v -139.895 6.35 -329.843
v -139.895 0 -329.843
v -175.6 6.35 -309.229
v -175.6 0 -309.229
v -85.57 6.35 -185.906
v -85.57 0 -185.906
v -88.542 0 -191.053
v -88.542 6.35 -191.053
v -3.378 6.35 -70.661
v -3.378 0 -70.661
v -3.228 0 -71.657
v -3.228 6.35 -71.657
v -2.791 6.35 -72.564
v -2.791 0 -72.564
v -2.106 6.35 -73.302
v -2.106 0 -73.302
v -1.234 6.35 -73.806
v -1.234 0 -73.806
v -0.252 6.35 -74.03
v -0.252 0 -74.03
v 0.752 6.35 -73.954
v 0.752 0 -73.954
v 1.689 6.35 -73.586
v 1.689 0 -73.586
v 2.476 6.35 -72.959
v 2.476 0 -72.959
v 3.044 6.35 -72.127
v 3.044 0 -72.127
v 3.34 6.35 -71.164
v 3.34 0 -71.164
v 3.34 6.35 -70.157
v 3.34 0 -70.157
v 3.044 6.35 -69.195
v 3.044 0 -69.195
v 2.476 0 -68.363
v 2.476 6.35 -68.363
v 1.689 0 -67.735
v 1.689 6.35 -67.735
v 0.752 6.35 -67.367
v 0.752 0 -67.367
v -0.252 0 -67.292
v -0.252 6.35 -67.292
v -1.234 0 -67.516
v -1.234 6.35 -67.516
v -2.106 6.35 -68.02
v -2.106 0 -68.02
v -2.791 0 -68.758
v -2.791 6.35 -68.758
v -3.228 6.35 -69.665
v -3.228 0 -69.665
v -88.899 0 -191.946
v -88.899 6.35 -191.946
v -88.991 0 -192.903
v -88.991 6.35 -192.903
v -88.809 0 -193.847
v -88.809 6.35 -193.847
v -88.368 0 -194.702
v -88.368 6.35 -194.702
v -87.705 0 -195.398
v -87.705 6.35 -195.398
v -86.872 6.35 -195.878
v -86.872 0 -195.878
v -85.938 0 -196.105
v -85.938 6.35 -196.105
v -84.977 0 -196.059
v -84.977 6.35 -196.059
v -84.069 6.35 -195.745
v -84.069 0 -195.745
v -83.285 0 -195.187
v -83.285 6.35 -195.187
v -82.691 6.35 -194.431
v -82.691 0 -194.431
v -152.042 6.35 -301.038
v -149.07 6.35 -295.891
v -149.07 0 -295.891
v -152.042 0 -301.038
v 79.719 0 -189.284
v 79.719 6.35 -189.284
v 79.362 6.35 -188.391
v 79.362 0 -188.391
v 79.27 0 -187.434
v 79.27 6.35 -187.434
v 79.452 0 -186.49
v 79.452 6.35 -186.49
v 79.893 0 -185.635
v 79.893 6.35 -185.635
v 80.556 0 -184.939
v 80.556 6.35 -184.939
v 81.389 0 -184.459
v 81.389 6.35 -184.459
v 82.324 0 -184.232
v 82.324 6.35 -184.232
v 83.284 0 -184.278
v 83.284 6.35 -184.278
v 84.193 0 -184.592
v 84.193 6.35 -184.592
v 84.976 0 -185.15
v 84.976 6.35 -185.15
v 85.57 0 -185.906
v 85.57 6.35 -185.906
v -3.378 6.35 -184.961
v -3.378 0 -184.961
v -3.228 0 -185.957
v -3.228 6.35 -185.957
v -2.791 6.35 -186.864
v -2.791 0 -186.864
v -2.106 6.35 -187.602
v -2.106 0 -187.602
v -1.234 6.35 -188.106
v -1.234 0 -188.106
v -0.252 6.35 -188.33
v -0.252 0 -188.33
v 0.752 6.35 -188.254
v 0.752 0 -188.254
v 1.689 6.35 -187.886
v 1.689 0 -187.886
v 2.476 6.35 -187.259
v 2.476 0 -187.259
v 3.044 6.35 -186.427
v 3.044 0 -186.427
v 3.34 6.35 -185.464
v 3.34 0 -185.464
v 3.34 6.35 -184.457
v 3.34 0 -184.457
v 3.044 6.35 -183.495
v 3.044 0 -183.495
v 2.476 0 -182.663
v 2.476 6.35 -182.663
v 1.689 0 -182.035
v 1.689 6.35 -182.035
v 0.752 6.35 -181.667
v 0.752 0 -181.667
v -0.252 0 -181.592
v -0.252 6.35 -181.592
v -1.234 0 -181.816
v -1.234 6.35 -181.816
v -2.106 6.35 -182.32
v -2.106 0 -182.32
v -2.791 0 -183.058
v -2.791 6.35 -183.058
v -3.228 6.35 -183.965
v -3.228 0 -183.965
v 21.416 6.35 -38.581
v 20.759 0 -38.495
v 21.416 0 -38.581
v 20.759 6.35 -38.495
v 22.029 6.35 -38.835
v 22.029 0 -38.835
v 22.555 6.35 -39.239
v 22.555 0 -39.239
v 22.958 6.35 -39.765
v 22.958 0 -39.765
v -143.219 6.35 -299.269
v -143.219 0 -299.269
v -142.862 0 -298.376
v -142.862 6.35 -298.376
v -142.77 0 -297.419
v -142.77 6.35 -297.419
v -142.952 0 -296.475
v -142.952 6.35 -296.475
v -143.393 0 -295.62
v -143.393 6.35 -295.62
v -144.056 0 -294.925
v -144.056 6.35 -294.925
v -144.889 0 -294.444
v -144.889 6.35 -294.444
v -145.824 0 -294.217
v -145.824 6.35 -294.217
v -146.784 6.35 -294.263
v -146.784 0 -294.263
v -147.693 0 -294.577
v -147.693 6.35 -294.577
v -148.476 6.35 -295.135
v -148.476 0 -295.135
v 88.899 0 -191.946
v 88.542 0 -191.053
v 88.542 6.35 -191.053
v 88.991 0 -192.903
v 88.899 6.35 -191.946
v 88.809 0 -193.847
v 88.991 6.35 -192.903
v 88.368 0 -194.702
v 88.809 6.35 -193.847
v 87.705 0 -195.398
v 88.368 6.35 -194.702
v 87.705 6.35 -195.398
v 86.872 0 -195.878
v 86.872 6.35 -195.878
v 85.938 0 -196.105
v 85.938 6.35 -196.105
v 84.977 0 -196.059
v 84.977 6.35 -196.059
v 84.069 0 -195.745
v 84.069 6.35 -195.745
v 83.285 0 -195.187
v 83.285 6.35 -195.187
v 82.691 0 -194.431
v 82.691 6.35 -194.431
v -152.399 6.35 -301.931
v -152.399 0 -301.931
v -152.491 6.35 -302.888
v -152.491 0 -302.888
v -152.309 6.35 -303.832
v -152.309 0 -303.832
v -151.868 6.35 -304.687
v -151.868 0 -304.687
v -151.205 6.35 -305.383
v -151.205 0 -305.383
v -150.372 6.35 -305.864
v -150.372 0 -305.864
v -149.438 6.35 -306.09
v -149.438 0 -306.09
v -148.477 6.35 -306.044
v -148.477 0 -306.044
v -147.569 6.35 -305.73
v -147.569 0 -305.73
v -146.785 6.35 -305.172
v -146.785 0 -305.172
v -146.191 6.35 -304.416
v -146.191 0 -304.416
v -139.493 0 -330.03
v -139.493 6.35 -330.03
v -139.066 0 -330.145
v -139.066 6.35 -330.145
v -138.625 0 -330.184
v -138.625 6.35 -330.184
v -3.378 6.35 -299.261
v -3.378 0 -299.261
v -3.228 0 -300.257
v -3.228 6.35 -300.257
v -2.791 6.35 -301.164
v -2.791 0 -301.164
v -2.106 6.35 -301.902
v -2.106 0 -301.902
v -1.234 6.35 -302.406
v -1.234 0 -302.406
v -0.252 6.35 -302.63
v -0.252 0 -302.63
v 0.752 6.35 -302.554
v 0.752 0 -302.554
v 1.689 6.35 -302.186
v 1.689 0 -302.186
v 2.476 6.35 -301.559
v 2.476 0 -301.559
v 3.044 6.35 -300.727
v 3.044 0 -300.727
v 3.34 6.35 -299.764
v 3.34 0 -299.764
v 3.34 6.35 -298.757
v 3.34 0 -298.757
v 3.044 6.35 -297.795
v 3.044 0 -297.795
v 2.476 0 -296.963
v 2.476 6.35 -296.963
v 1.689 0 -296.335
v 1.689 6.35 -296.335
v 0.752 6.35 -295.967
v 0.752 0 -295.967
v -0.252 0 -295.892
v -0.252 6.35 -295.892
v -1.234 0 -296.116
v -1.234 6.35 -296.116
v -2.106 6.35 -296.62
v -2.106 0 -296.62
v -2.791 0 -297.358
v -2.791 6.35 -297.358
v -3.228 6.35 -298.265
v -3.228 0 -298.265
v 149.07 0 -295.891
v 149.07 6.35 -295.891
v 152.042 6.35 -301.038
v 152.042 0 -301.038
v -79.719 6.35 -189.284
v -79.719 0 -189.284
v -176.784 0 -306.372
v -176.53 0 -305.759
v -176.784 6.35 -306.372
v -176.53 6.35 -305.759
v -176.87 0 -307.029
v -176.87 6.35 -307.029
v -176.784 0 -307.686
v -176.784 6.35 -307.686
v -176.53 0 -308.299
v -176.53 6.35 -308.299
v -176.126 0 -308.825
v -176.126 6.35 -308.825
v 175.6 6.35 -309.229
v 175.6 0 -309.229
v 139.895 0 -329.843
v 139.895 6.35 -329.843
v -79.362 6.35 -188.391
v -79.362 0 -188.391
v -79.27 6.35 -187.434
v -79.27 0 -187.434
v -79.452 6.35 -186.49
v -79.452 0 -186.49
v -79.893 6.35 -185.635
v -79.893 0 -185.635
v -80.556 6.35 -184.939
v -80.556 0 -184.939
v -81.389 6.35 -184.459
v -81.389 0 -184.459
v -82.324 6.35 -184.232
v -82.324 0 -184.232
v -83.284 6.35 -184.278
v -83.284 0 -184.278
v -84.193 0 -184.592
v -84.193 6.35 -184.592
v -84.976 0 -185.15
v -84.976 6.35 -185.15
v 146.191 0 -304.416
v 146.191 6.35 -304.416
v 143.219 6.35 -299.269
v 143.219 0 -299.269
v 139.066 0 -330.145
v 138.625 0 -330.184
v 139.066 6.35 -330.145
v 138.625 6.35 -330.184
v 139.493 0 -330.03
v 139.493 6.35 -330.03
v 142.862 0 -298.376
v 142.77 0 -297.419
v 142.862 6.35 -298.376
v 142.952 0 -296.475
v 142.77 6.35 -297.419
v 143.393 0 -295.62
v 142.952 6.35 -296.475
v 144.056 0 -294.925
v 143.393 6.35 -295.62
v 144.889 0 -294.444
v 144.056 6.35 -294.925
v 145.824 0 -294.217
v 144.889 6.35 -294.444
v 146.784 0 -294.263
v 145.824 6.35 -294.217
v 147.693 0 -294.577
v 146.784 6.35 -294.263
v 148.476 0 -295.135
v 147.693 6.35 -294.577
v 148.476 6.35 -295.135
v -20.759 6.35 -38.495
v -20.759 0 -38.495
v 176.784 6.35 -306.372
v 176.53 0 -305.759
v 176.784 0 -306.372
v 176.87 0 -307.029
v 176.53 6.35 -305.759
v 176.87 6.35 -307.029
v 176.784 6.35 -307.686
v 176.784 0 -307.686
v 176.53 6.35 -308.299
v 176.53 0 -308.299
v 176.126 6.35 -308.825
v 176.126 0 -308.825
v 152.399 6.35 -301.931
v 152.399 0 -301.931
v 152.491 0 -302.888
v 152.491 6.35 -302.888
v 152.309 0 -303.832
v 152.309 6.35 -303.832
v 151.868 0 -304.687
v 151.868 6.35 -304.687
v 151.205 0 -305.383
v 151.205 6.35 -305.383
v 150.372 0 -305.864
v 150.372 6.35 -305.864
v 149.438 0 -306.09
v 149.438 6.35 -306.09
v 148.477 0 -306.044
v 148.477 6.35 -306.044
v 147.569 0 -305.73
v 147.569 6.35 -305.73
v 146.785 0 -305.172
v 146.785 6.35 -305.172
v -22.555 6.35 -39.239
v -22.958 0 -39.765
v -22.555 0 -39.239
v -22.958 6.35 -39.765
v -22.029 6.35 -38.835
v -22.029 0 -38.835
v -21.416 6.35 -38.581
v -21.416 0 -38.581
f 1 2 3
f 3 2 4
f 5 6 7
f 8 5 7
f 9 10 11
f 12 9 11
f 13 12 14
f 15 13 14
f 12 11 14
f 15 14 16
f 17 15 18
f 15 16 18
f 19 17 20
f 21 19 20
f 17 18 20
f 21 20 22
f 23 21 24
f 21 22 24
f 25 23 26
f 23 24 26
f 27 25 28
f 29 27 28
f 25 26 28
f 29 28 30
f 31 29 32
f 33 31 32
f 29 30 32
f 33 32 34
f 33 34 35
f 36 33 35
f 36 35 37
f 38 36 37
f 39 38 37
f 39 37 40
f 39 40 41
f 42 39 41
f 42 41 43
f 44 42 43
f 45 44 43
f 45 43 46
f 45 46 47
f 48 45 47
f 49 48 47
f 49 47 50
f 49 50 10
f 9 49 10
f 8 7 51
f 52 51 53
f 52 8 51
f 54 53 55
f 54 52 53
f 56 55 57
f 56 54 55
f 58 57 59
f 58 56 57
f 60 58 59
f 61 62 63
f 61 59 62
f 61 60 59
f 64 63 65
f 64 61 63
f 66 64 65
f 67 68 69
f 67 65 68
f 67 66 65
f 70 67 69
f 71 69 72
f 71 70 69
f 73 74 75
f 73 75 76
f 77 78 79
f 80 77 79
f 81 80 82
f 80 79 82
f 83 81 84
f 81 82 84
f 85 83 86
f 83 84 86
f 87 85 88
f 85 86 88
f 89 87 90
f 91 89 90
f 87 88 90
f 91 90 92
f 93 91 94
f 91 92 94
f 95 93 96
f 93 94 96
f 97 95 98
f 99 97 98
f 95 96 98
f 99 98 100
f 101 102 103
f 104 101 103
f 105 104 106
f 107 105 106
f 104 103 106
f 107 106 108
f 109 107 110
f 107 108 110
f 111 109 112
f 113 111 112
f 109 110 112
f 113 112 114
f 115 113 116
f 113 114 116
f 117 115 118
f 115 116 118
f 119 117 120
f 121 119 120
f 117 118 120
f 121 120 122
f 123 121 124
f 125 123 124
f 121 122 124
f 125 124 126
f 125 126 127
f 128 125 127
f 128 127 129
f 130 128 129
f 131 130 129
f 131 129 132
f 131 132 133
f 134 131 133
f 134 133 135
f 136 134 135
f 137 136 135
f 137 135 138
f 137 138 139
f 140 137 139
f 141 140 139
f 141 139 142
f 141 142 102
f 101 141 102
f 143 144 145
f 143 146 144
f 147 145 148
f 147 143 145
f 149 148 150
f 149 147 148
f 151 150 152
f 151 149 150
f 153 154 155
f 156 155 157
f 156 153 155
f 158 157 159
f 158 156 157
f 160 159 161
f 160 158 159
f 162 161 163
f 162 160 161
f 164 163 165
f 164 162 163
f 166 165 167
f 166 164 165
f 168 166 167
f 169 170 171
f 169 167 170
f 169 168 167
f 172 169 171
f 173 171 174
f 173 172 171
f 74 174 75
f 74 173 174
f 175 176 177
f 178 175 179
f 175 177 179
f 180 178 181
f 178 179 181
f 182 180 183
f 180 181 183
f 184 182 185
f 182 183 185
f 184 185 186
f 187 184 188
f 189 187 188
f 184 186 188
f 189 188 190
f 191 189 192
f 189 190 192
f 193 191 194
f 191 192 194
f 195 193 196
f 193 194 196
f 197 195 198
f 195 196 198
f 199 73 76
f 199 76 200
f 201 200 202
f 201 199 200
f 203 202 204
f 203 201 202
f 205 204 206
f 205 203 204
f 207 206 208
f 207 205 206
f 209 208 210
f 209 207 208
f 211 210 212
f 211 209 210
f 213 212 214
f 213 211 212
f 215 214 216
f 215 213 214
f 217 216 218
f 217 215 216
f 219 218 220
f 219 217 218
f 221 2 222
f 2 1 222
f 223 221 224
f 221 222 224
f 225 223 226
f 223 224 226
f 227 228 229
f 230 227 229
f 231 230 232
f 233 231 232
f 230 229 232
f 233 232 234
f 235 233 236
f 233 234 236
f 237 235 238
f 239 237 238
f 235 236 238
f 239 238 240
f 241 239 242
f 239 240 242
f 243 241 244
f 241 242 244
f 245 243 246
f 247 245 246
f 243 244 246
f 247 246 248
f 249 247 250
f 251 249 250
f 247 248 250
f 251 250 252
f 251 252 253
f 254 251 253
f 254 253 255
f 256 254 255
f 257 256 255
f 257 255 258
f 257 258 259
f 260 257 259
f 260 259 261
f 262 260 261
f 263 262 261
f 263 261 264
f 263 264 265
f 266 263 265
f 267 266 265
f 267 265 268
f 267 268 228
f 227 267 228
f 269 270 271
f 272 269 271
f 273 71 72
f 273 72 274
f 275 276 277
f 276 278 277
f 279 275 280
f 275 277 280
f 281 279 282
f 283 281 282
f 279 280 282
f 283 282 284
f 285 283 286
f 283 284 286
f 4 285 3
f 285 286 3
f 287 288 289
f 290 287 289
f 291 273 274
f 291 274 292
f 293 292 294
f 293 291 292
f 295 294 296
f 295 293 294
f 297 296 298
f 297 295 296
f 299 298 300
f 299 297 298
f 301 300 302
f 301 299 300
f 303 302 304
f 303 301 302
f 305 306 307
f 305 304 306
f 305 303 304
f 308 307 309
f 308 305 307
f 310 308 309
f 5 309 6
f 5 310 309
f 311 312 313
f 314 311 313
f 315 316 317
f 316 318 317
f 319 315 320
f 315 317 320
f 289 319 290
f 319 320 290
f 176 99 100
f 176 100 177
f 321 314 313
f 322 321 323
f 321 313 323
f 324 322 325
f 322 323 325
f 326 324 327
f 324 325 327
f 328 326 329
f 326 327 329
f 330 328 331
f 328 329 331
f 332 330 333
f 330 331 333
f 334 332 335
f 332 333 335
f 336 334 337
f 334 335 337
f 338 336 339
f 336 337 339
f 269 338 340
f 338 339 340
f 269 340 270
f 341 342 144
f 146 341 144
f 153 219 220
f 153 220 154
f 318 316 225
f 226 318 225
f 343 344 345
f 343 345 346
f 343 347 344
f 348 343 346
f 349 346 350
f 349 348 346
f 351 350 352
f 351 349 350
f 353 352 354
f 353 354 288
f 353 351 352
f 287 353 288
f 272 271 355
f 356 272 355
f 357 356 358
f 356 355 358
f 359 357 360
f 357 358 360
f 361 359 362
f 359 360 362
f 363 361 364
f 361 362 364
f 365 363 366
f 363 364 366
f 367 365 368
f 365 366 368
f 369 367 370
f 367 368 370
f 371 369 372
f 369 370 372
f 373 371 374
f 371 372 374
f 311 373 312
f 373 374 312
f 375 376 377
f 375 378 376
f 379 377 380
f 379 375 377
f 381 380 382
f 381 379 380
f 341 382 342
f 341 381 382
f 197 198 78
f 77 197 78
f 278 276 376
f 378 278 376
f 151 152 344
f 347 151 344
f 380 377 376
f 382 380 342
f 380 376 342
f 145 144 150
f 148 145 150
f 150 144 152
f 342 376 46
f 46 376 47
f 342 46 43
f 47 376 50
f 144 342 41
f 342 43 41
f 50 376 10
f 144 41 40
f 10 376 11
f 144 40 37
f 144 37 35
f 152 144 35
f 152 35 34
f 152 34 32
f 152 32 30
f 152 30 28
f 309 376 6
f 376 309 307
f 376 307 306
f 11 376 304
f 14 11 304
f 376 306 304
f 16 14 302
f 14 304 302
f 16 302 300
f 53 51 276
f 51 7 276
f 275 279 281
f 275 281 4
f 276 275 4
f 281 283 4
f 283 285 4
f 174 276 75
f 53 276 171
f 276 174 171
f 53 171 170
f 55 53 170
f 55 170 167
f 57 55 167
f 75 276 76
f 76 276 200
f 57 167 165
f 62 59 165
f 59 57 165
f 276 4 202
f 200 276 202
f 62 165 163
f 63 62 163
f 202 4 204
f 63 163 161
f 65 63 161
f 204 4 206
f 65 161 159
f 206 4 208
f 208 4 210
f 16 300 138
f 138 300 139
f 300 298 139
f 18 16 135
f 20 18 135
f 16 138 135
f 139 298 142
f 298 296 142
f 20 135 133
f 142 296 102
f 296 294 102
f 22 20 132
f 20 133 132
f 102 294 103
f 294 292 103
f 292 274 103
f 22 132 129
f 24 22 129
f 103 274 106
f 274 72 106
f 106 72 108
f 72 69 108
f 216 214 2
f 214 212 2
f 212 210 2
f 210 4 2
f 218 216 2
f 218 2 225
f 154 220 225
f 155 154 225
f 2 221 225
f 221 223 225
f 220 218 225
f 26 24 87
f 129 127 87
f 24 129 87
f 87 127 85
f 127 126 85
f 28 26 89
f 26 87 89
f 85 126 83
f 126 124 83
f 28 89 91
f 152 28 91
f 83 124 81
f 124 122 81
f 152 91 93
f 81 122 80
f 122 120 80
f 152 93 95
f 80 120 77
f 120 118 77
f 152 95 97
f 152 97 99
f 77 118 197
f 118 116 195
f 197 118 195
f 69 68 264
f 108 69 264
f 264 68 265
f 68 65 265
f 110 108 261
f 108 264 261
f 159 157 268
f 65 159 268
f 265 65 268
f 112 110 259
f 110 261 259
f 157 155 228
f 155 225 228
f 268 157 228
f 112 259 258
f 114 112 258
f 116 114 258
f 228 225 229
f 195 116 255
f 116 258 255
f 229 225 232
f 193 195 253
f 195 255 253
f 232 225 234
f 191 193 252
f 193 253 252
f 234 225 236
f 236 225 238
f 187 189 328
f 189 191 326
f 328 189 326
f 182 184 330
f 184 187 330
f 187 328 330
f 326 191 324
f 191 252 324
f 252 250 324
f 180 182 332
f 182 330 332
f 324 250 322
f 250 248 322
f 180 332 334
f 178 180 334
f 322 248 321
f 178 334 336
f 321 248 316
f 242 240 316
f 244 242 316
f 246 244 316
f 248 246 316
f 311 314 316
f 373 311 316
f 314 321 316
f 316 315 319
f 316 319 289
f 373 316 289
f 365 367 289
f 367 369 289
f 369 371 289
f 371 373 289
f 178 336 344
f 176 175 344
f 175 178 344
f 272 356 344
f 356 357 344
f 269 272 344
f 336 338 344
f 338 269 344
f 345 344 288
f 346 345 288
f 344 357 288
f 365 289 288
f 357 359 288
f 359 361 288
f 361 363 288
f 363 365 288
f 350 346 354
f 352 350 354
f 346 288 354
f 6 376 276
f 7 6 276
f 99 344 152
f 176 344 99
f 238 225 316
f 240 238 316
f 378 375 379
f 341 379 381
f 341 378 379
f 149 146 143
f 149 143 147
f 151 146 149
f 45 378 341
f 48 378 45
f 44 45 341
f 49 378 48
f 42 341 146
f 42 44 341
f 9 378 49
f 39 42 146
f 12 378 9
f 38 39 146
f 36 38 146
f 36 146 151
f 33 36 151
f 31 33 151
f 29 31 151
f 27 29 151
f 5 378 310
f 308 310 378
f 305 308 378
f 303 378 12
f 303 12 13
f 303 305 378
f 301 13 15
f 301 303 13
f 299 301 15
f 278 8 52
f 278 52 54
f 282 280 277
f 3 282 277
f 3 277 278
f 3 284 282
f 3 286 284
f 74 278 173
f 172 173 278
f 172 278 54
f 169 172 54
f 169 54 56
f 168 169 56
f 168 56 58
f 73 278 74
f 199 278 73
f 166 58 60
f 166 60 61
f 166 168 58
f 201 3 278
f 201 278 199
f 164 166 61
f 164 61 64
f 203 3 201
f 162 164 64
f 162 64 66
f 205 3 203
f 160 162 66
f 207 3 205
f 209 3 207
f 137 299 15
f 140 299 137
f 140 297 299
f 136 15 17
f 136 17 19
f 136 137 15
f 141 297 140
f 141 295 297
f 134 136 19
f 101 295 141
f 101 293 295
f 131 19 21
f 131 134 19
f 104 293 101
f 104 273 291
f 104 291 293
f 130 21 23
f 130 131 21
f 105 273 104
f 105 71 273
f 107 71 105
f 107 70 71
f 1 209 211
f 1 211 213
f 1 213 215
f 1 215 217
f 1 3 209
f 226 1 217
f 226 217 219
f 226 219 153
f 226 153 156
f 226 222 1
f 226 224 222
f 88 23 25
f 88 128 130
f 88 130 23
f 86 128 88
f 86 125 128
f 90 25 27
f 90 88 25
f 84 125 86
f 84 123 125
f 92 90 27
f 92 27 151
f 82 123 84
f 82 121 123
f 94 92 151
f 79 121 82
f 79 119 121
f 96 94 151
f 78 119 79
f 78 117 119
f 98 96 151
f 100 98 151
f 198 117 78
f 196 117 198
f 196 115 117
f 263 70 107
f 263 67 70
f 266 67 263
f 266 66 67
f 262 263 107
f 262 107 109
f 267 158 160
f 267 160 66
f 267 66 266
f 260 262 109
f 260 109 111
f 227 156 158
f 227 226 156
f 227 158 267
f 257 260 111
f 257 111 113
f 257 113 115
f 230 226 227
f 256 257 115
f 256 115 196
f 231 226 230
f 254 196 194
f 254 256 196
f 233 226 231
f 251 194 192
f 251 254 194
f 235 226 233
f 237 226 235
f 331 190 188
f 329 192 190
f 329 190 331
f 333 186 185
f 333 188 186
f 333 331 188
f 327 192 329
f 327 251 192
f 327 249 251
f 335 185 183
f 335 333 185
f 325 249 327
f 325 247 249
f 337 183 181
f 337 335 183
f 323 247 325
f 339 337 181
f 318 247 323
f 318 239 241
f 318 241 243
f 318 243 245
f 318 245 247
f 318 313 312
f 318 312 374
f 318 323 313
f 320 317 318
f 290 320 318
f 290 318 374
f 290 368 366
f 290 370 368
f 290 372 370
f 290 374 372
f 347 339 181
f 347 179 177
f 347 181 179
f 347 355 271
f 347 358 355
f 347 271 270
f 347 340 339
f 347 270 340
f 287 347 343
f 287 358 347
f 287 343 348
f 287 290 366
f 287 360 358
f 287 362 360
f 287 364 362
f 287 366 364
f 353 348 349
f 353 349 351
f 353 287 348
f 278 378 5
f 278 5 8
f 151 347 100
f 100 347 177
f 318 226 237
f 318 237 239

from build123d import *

# Parameters (mm, degrees)
BOSS_EXTRUDE1_DEPTH     = 6.35
F_1_4_CLEARANCE_HOLE1_D = 6.7564
CUT_EXTRUDE1_DEPTH      = 376.065853402
FILLET1_R               = 2.54


with BuildPart() as part:
    # Sketch1 → Boss-Extrude1 (new body)
    with BuildSketch(Plane(origin=(0, 0, 0), x_dir=(1, 0, 0), z_dir=(0, 1, 0))):
        Polygon((-177.8, 307.958633586), (-22.225, 38.494829198), (22.225, 38.494829198), (177.8, 307.958633586), (139.305170802, 330.183633586), (-139.305170802, 330.183633586), align=None)
    extrude(amount=BOSS_EXTRUDE1_DEPTH)

    # 1/4 Clearance Hole1 (through all)
    with Locations(Plane(origin=(0, 6.35, 0), x_dir=(1, 0, 0), z_dir=(0, 1, 0))):
        with Locations((0, 299.260881198), (0, 70.660881198), (0, 184.960881198)):
            Hole(F_1_4_CLEARANCE_HOLE1_D / 2)

    # Sketch6 → Cut-Extrude1 (cut, through all)
    with BuildSketch(Plane(origin=(0, 6.35, 0), x_dir=(1, 0, 0), z_dir=(0, 1, 0))):
        with BuildLine():
            Line((-146.190878382, 304.41642896), (-143.219078382, 299.269120371))
            ThreePointArc((-143.219078382, 299.269120371), (-144.455585401, 294.654413351), (-149.07029242, 295.890920371))
            Line((-149.07029242, 295.890920371), (-152.04209242, 301.03822896))
            ThreePointArc((-152.04209242, 301.03822896), (-150.805585401, 305.65293598), (-146.190878382, 304.41642896))
        make_face()
        with BuildLine():
            Line((-85.57029242, 185.90569409), (-88.54209242, 191.05300268))
            ThreePointArc((-88.54209242, 191.05300268), (-87.305585401, 195.667709699), (-82.690878382, 194.43120268))
            Line((-82.690878382, 194.43120268), (-79.719078382, 189.28389409))
            ThreePointArc((-79.719078382, 189.28389409), (-80.955585401, 184.669187071), (-85.57029242, 185.90569409))
        make_face()
        with BuildLine():
            Line((146.190878382, 304.41642896), (143.219078382, 299.269120371))
            ThreePointArc((143.219078382, 299.269120371), (144.455585401, 294.654413351), (149.07029242, 295.890920371))
            Line((149.07029242, 295.890920371), (152.04209242, 301.03822896))
            ThreePointArc((152.04209242, 301.03822896), (150.805585401, 305.65293598), (146.190878382, 304.41642896))
        make_face()
        with BuildLine():
            Line((85.57029242, 185.90569409), (88.54209242, 191.05300268))
            ThreePointArc((88.54209242, 191.05300268), (87.305585401, 195.667709699), (82.690878382, 194.43120268))
            Line((82.690878382, 194.43120268), (79.719078382, 189.28389409))
            ThreePointArc((79.719078382, 189.28389409), (80.955585401, 184.669187071), (85.57029242, 185.90569409))
        make_face()
    extrude(amount=-CUT_EXTRUDE1_DEPTH, mode=Mode.SUBTRACT)

    # Fillet1
    fillet1_edges = [part.edges().sort_by_distance(p)[0] for p in [
        (22.225, 3.175, -38.494829198),
        (-22.225, 3.175, -38.494829198),
        (-177.8, 3.175, -307.958633586),
        (-139.305170802, 3.175, -330.183633586),
        (139.305170802, 3.175, -330.183633586),
        (177.8, 3.175, -307.958633586),
    ]]
    fillet(fillet1_edges, radius=FILLET1_R)


solid = part.part
